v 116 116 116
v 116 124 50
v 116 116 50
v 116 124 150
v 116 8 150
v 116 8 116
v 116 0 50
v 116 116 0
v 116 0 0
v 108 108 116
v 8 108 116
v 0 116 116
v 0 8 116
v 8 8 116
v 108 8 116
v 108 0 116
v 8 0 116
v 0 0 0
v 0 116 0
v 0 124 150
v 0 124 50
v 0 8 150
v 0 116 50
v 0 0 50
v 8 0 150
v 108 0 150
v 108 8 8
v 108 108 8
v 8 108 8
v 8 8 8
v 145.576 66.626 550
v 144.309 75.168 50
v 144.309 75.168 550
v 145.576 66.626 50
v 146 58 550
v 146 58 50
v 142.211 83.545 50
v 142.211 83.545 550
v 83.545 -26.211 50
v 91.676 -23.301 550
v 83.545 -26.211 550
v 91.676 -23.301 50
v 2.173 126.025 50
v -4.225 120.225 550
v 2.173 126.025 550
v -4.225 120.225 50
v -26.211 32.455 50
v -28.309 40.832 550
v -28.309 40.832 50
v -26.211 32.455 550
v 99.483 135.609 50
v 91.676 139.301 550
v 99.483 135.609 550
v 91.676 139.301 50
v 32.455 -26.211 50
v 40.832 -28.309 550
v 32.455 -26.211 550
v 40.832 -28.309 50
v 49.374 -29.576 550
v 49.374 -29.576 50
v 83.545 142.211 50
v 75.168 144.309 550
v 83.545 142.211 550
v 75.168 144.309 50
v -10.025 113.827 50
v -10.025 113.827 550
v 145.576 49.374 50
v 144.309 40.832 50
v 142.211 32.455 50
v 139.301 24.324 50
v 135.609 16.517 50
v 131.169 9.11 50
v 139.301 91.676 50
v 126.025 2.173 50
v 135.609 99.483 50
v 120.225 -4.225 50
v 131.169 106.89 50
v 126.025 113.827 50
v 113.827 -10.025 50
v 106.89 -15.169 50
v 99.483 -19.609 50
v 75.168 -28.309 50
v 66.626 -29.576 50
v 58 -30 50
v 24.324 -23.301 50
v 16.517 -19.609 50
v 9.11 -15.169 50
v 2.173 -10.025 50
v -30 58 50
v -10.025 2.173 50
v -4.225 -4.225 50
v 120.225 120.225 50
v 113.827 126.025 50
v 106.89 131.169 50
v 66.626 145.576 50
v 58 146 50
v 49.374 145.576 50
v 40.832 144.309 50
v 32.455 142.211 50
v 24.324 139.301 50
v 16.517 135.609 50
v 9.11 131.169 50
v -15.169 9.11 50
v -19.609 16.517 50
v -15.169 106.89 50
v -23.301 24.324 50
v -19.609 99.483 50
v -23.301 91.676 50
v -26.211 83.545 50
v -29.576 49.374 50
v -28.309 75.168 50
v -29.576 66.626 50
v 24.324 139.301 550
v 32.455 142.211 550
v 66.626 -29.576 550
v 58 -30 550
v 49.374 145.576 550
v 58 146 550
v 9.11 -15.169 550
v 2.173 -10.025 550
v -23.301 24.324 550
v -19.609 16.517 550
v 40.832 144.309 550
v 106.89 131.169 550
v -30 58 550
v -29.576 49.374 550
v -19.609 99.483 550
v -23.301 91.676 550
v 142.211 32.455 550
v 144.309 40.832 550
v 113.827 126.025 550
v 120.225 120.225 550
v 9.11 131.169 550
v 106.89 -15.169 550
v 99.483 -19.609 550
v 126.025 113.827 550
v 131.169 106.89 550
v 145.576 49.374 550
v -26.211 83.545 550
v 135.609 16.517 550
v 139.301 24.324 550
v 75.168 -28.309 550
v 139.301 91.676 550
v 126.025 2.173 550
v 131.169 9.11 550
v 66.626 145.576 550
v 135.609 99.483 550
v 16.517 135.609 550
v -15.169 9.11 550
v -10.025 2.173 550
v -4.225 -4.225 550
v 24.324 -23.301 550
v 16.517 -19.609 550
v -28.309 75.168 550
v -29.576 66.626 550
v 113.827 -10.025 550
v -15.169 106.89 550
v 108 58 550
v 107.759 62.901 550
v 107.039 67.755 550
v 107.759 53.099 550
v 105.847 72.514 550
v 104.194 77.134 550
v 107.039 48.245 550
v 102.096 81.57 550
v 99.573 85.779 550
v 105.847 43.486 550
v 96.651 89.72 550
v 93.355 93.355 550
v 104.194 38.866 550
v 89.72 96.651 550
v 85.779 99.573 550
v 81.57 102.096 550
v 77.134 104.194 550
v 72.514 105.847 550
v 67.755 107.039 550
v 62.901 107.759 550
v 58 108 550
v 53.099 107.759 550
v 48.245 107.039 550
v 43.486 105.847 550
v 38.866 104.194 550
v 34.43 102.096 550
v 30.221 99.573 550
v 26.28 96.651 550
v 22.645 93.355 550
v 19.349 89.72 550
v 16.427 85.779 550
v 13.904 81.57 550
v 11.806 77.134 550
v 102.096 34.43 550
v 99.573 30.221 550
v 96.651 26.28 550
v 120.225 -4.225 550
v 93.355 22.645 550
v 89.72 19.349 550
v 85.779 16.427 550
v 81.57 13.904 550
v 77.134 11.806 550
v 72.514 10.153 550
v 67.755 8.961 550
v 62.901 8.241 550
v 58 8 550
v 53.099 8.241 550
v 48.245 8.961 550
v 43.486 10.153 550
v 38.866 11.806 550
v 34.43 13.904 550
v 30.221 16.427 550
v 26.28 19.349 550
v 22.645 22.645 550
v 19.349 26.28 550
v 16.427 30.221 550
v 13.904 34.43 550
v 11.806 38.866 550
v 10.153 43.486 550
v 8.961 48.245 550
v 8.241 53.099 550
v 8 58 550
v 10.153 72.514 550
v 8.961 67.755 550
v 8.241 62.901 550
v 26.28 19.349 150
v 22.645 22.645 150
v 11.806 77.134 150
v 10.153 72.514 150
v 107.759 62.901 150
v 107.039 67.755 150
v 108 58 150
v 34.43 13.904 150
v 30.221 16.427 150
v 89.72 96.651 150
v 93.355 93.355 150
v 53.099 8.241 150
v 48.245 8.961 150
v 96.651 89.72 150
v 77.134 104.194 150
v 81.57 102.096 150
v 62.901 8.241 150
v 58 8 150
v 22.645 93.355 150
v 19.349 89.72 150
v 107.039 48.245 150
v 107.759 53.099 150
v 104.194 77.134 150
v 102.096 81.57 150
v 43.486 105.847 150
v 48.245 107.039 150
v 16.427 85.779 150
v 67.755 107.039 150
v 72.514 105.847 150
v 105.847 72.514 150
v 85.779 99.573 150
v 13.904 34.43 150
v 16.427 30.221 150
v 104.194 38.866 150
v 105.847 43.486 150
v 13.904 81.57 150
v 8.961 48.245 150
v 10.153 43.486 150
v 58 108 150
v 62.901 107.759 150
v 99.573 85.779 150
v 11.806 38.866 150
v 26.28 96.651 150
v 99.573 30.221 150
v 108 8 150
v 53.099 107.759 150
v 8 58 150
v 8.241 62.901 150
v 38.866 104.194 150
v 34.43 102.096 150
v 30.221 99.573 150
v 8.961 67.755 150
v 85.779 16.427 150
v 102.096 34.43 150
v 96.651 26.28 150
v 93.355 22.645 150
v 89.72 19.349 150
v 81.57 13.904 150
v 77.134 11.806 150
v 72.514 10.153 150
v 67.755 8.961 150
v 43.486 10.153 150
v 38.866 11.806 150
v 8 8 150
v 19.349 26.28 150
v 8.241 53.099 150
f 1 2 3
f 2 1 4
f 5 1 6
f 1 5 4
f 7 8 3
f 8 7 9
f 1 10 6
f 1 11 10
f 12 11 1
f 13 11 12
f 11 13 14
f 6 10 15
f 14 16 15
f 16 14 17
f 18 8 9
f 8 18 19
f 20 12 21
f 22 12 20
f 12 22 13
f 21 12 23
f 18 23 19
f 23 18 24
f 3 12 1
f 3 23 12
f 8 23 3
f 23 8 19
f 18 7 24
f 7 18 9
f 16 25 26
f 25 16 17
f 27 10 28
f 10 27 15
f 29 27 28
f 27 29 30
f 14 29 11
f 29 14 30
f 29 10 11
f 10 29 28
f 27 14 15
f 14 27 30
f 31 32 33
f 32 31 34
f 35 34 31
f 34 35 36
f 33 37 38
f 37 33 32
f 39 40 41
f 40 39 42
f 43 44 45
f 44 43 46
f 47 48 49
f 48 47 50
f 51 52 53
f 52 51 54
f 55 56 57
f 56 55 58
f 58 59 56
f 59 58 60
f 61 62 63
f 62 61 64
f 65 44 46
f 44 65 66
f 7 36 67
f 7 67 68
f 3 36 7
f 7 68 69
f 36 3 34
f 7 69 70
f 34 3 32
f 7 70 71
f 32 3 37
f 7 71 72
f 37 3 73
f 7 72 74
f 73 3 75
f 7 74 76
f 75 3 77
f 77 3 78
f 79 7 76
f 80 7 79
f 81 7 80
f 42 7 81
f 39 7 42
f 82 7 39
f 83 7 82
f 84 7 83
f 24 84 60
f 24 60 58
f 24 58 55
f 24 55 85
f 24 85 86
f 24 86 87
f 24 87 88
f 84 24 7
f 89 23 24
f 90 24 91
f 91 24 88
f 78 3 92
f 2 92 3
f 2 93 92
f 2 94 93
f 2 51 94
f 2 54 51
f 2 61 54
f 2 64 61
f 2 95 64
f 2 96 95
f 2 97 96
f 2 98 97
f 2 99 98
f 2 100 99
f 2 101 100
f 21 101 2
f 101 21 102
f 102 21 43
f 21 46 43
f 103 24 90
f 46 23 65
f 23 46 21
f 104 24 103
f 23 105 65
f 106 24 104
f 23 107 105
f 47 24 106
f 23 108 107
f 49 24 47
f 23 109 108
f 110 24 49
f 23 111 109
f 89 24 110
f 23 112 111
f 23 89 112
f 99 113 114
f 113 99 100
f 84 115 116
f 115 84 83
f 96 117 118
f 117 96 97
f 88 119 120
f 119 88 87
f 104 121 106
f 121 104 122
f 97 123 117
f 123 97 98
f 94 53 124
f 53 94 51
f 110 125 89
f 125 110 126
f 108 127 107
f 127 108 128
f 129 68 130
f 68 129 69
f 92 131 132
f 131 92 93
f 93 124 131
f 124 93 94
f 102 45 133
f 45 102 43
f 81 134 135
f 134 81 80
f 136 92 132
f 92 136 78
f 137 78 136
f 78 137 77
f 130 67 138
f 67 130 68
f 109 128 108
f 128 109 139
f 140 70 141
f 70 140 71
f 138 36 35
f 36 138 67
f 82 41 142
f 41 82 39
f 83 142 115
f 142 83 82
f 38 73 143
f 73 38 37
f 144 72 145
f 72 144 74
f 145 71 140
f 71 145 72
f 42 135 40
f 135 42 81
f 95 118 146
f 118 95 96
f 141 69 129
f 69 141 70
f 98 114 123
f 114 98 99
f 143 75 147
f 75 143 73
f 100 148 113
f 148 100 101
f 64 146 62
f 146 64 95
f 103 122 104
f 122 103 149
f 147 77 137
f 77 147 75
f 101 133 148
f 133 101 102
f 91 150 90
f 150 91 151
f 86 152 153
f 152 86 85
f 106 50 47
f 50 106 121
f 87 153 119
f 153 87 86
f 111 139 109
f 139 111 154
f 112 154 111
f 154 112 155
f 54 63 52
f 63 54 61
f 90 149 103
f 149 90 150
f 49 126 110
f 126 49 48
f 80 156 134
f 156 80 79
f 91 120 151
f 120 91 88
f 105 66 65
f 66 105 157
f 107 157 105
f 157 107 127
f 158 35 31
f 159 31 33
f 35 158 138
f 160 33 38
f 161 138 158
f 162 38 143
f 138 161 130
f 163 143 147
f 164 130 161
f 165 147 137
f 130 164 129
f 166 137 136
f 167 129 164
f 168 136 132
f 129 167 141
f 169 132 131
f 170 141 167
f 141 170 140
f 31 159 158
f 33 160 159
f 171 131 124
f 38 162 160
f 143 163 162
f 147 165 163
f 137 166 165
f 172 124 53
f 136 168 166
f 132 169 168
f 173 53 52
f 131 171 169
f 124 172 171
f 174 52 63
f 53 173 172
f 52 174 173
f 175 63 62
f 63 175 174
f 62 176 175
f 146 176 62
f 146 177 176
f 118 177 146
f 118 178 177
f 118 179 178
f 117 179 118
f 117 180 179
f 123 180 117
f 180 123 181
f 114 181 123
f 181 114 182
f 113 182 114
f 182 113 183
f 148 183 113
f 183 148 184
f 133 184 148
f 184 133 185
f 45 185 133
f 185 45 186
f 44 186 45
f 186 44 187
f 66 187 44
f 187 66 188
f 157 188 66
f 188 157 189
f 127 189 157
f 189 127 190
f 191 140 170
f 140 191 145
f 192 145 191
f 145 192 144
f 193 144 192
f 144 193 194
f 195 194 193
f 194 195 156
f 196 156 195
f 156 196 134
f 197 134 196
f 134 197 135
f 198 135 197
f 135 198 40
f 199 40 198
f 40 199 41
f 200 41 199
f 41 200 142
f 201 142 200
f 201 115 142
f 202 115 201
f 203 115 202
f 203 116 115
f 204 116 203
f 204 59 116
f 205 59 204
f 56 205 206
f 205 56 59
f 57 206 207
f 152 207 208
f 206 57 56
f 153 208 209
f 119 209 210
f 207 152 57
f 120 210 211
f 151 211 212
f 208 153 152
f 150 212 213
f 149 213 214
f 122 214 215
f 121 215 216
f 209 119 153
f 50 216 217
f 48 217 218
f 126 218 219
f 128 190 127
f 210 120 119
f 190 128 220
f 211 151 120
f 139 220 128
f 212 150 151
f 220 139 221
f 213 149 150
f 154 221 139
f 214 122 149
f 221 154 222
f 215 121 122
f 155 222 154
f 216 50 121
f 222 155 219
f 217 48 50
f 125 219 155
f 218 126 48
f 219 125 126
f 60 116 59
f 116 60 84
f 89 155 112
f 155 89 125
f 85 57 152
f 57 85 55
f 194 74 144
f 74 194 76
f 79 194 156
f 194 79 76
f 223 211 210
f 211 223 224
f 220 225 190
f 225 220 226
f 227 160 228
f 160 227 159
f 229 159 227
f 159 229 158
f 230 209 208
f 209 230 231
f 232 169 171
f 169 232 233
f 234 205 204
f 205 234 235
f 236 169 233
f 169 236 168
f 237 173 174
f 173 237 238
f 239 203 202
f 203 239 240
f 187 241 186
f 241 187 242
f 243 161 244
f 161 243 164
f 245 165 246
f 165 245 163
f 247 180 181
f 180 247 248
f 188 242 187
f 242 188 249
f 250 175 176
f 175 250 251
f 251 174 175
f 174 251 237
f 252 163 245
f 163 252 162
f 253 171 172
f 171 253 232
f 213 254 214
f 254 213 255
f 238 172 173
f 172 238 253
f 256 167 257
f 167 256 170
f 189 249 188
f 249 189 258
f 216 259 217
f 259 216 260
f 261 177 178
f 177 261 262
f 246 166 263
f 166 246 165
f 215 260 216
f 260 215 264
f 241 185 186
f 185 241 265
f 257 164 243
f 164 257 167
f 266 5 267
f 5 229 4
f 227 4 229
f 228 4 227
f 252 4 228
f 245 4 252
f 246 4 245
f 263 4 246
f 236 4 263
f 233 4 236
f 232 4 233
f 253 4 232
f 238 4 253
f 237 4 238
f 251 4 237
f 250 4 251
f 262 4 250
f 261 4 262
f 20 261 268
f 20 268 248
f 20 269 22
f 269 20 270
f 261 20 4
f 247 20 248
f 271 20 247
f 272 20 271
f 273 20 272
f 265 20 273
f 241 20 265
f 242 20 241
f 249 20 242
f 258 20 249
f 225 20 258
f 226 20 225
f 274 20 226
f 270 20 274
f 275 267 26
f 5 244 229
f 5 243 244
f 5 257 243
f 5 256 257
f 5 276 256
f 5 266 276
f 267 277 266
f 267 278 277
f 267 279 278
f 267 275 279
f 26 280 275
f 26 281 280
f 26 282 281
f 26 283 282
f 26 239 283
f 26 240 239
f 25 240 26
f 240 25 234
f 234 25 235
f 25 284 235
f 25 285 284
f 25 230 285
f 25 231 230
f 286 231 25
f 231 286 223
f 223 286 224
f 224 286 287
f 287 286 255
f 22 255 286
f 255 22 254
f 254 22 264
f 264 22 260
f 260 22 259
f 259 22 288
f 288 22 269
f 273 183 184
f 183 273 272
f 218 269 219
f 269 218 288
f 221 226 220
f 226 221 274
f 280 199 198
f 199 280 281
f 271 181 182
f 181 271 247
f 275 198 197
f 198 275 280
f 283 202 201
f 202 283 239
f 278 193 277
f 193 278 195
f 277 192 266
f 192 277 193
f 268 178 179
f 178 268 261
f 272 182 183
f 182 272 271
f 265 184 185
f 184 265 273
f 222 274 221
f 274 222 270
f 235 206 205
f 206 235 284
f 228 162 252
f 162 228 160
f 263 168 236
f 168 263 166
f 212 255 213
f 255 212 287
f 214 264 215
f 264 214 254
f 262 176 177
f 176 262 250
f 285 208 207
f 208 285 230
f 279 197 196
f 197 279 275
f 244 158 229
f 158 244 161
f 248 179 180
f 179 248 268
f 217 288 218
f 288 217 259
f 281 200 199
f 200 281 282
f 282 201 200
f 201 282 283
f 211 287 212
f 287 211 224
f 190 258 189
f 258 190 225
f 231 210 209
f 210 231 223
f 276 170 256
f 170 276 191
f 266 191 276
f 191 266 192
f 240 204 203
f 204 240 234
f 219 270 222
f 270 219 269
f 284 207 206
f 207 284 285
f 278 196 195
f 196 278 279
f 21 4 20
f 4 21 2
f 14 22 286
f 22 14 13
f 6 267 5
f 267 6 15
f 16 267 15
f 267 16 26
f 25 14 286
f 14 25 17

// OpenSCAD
// Rocket Stove — Parametric Model
// Entry: pnk:01HZX0K8J9Q7R3VY6T2M4B8N40/energy/fire-combustion
// License: MIT

feed_w       = 100;   // mm
feed_h       = 100;   // mm
feed_len     = 300;   // mm
riser_h      = 400;   // mm
riser_w      = 100;   // mm
wall         = 8;     // mm
insulation   = 30;    // mm

module shell() {
    difference() {
        // Outer barrel
        cylinder(h=riser_h + feed_h, d=riser_w + 2*(wall + insulation), $fn=64);
        // Inner riser
        translate([0, 0, feed_h])
            cylinder(h=riser_h, d=riser_w, $fn=64);
        // Feed tube opening
        translate([-feed_w / 2 - wall, -feed_w / 2, -1])
            cube([feed_w + wall * 2, feed_w + wall * 2, feed_h + 1]);
        translate([-feed_w / 2, -feed_w / 2 - wall, 0])
            cube([feed_w, feed_w + wall, feed_h]);
    }
}

module feed_tube() {
    difference() {
        cube([feed_w + 2*wall, feed_w + 2*wall, feed_h + 2*wall]);
        translate([wall, wall, wall])
            cube([feed_w, feed_w, feed_h + wall]);
    }
}

translate([0, 0, 0]) feed_tube();
translate([feed_w / 2 + wall, feed_w / 2 + wall, feed_h / 2]) shell();
